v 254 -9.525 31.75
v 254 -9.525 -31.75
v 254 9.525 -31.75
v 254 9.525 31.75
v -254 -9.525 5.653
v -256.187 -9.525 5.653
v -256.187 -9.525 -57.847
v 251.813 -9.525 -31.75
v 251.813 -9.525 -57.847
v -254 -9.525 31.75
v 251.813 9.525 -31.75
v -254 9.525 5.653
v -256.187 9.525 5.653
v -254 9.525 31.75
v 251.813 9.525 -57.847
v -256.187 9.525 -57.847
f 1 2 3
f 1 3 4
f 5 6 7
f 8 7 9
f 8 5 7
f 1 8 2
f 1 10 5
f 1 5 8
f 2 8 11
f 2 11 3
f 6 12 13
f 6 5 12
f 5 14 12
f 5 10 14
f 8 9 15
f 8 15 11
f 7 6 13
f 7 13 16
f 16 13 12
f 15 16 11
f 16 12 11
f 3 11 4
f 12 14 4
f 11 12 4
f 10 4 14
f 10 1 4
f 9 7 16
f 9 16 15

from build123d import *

# Parameters (mm, degrees)
F0_W     = 505.8128448129
F0_H     = 37.4025163994
F1_DEPTH = 9.525


# Not quite as in the source:
# - the program builds the solid bodies; features that only make, move or delete a surface that nothing else refers to are left out


with BuildPart() as f1:
    # F0 (on Front) → F1 (new body, symmetric)
    with BuildSketch(Plane.XZ):
        Polygon((-254, 5.6525163994), (-256.1871551871, 5.6525163994), (-256.1871551871, -57.8474836006), (251.8128448129, -57.8474836006), (251.8128448129, -31.75), (-254, -31.75), align=None)
        Polygon((-254, 31.75), (-254, 5.6525163994), (251.8128448129, 5.6525163994), (251.8128448129, -31.75), (254, -31.75), (254, 31.75), align=None)
        with Locations((-1.0935775936, -13.0487418003)):
            Rectangle(F0_W, F0_H)
    extrude(amount=F1_DEPTH, both=True)


solid = f1.part
